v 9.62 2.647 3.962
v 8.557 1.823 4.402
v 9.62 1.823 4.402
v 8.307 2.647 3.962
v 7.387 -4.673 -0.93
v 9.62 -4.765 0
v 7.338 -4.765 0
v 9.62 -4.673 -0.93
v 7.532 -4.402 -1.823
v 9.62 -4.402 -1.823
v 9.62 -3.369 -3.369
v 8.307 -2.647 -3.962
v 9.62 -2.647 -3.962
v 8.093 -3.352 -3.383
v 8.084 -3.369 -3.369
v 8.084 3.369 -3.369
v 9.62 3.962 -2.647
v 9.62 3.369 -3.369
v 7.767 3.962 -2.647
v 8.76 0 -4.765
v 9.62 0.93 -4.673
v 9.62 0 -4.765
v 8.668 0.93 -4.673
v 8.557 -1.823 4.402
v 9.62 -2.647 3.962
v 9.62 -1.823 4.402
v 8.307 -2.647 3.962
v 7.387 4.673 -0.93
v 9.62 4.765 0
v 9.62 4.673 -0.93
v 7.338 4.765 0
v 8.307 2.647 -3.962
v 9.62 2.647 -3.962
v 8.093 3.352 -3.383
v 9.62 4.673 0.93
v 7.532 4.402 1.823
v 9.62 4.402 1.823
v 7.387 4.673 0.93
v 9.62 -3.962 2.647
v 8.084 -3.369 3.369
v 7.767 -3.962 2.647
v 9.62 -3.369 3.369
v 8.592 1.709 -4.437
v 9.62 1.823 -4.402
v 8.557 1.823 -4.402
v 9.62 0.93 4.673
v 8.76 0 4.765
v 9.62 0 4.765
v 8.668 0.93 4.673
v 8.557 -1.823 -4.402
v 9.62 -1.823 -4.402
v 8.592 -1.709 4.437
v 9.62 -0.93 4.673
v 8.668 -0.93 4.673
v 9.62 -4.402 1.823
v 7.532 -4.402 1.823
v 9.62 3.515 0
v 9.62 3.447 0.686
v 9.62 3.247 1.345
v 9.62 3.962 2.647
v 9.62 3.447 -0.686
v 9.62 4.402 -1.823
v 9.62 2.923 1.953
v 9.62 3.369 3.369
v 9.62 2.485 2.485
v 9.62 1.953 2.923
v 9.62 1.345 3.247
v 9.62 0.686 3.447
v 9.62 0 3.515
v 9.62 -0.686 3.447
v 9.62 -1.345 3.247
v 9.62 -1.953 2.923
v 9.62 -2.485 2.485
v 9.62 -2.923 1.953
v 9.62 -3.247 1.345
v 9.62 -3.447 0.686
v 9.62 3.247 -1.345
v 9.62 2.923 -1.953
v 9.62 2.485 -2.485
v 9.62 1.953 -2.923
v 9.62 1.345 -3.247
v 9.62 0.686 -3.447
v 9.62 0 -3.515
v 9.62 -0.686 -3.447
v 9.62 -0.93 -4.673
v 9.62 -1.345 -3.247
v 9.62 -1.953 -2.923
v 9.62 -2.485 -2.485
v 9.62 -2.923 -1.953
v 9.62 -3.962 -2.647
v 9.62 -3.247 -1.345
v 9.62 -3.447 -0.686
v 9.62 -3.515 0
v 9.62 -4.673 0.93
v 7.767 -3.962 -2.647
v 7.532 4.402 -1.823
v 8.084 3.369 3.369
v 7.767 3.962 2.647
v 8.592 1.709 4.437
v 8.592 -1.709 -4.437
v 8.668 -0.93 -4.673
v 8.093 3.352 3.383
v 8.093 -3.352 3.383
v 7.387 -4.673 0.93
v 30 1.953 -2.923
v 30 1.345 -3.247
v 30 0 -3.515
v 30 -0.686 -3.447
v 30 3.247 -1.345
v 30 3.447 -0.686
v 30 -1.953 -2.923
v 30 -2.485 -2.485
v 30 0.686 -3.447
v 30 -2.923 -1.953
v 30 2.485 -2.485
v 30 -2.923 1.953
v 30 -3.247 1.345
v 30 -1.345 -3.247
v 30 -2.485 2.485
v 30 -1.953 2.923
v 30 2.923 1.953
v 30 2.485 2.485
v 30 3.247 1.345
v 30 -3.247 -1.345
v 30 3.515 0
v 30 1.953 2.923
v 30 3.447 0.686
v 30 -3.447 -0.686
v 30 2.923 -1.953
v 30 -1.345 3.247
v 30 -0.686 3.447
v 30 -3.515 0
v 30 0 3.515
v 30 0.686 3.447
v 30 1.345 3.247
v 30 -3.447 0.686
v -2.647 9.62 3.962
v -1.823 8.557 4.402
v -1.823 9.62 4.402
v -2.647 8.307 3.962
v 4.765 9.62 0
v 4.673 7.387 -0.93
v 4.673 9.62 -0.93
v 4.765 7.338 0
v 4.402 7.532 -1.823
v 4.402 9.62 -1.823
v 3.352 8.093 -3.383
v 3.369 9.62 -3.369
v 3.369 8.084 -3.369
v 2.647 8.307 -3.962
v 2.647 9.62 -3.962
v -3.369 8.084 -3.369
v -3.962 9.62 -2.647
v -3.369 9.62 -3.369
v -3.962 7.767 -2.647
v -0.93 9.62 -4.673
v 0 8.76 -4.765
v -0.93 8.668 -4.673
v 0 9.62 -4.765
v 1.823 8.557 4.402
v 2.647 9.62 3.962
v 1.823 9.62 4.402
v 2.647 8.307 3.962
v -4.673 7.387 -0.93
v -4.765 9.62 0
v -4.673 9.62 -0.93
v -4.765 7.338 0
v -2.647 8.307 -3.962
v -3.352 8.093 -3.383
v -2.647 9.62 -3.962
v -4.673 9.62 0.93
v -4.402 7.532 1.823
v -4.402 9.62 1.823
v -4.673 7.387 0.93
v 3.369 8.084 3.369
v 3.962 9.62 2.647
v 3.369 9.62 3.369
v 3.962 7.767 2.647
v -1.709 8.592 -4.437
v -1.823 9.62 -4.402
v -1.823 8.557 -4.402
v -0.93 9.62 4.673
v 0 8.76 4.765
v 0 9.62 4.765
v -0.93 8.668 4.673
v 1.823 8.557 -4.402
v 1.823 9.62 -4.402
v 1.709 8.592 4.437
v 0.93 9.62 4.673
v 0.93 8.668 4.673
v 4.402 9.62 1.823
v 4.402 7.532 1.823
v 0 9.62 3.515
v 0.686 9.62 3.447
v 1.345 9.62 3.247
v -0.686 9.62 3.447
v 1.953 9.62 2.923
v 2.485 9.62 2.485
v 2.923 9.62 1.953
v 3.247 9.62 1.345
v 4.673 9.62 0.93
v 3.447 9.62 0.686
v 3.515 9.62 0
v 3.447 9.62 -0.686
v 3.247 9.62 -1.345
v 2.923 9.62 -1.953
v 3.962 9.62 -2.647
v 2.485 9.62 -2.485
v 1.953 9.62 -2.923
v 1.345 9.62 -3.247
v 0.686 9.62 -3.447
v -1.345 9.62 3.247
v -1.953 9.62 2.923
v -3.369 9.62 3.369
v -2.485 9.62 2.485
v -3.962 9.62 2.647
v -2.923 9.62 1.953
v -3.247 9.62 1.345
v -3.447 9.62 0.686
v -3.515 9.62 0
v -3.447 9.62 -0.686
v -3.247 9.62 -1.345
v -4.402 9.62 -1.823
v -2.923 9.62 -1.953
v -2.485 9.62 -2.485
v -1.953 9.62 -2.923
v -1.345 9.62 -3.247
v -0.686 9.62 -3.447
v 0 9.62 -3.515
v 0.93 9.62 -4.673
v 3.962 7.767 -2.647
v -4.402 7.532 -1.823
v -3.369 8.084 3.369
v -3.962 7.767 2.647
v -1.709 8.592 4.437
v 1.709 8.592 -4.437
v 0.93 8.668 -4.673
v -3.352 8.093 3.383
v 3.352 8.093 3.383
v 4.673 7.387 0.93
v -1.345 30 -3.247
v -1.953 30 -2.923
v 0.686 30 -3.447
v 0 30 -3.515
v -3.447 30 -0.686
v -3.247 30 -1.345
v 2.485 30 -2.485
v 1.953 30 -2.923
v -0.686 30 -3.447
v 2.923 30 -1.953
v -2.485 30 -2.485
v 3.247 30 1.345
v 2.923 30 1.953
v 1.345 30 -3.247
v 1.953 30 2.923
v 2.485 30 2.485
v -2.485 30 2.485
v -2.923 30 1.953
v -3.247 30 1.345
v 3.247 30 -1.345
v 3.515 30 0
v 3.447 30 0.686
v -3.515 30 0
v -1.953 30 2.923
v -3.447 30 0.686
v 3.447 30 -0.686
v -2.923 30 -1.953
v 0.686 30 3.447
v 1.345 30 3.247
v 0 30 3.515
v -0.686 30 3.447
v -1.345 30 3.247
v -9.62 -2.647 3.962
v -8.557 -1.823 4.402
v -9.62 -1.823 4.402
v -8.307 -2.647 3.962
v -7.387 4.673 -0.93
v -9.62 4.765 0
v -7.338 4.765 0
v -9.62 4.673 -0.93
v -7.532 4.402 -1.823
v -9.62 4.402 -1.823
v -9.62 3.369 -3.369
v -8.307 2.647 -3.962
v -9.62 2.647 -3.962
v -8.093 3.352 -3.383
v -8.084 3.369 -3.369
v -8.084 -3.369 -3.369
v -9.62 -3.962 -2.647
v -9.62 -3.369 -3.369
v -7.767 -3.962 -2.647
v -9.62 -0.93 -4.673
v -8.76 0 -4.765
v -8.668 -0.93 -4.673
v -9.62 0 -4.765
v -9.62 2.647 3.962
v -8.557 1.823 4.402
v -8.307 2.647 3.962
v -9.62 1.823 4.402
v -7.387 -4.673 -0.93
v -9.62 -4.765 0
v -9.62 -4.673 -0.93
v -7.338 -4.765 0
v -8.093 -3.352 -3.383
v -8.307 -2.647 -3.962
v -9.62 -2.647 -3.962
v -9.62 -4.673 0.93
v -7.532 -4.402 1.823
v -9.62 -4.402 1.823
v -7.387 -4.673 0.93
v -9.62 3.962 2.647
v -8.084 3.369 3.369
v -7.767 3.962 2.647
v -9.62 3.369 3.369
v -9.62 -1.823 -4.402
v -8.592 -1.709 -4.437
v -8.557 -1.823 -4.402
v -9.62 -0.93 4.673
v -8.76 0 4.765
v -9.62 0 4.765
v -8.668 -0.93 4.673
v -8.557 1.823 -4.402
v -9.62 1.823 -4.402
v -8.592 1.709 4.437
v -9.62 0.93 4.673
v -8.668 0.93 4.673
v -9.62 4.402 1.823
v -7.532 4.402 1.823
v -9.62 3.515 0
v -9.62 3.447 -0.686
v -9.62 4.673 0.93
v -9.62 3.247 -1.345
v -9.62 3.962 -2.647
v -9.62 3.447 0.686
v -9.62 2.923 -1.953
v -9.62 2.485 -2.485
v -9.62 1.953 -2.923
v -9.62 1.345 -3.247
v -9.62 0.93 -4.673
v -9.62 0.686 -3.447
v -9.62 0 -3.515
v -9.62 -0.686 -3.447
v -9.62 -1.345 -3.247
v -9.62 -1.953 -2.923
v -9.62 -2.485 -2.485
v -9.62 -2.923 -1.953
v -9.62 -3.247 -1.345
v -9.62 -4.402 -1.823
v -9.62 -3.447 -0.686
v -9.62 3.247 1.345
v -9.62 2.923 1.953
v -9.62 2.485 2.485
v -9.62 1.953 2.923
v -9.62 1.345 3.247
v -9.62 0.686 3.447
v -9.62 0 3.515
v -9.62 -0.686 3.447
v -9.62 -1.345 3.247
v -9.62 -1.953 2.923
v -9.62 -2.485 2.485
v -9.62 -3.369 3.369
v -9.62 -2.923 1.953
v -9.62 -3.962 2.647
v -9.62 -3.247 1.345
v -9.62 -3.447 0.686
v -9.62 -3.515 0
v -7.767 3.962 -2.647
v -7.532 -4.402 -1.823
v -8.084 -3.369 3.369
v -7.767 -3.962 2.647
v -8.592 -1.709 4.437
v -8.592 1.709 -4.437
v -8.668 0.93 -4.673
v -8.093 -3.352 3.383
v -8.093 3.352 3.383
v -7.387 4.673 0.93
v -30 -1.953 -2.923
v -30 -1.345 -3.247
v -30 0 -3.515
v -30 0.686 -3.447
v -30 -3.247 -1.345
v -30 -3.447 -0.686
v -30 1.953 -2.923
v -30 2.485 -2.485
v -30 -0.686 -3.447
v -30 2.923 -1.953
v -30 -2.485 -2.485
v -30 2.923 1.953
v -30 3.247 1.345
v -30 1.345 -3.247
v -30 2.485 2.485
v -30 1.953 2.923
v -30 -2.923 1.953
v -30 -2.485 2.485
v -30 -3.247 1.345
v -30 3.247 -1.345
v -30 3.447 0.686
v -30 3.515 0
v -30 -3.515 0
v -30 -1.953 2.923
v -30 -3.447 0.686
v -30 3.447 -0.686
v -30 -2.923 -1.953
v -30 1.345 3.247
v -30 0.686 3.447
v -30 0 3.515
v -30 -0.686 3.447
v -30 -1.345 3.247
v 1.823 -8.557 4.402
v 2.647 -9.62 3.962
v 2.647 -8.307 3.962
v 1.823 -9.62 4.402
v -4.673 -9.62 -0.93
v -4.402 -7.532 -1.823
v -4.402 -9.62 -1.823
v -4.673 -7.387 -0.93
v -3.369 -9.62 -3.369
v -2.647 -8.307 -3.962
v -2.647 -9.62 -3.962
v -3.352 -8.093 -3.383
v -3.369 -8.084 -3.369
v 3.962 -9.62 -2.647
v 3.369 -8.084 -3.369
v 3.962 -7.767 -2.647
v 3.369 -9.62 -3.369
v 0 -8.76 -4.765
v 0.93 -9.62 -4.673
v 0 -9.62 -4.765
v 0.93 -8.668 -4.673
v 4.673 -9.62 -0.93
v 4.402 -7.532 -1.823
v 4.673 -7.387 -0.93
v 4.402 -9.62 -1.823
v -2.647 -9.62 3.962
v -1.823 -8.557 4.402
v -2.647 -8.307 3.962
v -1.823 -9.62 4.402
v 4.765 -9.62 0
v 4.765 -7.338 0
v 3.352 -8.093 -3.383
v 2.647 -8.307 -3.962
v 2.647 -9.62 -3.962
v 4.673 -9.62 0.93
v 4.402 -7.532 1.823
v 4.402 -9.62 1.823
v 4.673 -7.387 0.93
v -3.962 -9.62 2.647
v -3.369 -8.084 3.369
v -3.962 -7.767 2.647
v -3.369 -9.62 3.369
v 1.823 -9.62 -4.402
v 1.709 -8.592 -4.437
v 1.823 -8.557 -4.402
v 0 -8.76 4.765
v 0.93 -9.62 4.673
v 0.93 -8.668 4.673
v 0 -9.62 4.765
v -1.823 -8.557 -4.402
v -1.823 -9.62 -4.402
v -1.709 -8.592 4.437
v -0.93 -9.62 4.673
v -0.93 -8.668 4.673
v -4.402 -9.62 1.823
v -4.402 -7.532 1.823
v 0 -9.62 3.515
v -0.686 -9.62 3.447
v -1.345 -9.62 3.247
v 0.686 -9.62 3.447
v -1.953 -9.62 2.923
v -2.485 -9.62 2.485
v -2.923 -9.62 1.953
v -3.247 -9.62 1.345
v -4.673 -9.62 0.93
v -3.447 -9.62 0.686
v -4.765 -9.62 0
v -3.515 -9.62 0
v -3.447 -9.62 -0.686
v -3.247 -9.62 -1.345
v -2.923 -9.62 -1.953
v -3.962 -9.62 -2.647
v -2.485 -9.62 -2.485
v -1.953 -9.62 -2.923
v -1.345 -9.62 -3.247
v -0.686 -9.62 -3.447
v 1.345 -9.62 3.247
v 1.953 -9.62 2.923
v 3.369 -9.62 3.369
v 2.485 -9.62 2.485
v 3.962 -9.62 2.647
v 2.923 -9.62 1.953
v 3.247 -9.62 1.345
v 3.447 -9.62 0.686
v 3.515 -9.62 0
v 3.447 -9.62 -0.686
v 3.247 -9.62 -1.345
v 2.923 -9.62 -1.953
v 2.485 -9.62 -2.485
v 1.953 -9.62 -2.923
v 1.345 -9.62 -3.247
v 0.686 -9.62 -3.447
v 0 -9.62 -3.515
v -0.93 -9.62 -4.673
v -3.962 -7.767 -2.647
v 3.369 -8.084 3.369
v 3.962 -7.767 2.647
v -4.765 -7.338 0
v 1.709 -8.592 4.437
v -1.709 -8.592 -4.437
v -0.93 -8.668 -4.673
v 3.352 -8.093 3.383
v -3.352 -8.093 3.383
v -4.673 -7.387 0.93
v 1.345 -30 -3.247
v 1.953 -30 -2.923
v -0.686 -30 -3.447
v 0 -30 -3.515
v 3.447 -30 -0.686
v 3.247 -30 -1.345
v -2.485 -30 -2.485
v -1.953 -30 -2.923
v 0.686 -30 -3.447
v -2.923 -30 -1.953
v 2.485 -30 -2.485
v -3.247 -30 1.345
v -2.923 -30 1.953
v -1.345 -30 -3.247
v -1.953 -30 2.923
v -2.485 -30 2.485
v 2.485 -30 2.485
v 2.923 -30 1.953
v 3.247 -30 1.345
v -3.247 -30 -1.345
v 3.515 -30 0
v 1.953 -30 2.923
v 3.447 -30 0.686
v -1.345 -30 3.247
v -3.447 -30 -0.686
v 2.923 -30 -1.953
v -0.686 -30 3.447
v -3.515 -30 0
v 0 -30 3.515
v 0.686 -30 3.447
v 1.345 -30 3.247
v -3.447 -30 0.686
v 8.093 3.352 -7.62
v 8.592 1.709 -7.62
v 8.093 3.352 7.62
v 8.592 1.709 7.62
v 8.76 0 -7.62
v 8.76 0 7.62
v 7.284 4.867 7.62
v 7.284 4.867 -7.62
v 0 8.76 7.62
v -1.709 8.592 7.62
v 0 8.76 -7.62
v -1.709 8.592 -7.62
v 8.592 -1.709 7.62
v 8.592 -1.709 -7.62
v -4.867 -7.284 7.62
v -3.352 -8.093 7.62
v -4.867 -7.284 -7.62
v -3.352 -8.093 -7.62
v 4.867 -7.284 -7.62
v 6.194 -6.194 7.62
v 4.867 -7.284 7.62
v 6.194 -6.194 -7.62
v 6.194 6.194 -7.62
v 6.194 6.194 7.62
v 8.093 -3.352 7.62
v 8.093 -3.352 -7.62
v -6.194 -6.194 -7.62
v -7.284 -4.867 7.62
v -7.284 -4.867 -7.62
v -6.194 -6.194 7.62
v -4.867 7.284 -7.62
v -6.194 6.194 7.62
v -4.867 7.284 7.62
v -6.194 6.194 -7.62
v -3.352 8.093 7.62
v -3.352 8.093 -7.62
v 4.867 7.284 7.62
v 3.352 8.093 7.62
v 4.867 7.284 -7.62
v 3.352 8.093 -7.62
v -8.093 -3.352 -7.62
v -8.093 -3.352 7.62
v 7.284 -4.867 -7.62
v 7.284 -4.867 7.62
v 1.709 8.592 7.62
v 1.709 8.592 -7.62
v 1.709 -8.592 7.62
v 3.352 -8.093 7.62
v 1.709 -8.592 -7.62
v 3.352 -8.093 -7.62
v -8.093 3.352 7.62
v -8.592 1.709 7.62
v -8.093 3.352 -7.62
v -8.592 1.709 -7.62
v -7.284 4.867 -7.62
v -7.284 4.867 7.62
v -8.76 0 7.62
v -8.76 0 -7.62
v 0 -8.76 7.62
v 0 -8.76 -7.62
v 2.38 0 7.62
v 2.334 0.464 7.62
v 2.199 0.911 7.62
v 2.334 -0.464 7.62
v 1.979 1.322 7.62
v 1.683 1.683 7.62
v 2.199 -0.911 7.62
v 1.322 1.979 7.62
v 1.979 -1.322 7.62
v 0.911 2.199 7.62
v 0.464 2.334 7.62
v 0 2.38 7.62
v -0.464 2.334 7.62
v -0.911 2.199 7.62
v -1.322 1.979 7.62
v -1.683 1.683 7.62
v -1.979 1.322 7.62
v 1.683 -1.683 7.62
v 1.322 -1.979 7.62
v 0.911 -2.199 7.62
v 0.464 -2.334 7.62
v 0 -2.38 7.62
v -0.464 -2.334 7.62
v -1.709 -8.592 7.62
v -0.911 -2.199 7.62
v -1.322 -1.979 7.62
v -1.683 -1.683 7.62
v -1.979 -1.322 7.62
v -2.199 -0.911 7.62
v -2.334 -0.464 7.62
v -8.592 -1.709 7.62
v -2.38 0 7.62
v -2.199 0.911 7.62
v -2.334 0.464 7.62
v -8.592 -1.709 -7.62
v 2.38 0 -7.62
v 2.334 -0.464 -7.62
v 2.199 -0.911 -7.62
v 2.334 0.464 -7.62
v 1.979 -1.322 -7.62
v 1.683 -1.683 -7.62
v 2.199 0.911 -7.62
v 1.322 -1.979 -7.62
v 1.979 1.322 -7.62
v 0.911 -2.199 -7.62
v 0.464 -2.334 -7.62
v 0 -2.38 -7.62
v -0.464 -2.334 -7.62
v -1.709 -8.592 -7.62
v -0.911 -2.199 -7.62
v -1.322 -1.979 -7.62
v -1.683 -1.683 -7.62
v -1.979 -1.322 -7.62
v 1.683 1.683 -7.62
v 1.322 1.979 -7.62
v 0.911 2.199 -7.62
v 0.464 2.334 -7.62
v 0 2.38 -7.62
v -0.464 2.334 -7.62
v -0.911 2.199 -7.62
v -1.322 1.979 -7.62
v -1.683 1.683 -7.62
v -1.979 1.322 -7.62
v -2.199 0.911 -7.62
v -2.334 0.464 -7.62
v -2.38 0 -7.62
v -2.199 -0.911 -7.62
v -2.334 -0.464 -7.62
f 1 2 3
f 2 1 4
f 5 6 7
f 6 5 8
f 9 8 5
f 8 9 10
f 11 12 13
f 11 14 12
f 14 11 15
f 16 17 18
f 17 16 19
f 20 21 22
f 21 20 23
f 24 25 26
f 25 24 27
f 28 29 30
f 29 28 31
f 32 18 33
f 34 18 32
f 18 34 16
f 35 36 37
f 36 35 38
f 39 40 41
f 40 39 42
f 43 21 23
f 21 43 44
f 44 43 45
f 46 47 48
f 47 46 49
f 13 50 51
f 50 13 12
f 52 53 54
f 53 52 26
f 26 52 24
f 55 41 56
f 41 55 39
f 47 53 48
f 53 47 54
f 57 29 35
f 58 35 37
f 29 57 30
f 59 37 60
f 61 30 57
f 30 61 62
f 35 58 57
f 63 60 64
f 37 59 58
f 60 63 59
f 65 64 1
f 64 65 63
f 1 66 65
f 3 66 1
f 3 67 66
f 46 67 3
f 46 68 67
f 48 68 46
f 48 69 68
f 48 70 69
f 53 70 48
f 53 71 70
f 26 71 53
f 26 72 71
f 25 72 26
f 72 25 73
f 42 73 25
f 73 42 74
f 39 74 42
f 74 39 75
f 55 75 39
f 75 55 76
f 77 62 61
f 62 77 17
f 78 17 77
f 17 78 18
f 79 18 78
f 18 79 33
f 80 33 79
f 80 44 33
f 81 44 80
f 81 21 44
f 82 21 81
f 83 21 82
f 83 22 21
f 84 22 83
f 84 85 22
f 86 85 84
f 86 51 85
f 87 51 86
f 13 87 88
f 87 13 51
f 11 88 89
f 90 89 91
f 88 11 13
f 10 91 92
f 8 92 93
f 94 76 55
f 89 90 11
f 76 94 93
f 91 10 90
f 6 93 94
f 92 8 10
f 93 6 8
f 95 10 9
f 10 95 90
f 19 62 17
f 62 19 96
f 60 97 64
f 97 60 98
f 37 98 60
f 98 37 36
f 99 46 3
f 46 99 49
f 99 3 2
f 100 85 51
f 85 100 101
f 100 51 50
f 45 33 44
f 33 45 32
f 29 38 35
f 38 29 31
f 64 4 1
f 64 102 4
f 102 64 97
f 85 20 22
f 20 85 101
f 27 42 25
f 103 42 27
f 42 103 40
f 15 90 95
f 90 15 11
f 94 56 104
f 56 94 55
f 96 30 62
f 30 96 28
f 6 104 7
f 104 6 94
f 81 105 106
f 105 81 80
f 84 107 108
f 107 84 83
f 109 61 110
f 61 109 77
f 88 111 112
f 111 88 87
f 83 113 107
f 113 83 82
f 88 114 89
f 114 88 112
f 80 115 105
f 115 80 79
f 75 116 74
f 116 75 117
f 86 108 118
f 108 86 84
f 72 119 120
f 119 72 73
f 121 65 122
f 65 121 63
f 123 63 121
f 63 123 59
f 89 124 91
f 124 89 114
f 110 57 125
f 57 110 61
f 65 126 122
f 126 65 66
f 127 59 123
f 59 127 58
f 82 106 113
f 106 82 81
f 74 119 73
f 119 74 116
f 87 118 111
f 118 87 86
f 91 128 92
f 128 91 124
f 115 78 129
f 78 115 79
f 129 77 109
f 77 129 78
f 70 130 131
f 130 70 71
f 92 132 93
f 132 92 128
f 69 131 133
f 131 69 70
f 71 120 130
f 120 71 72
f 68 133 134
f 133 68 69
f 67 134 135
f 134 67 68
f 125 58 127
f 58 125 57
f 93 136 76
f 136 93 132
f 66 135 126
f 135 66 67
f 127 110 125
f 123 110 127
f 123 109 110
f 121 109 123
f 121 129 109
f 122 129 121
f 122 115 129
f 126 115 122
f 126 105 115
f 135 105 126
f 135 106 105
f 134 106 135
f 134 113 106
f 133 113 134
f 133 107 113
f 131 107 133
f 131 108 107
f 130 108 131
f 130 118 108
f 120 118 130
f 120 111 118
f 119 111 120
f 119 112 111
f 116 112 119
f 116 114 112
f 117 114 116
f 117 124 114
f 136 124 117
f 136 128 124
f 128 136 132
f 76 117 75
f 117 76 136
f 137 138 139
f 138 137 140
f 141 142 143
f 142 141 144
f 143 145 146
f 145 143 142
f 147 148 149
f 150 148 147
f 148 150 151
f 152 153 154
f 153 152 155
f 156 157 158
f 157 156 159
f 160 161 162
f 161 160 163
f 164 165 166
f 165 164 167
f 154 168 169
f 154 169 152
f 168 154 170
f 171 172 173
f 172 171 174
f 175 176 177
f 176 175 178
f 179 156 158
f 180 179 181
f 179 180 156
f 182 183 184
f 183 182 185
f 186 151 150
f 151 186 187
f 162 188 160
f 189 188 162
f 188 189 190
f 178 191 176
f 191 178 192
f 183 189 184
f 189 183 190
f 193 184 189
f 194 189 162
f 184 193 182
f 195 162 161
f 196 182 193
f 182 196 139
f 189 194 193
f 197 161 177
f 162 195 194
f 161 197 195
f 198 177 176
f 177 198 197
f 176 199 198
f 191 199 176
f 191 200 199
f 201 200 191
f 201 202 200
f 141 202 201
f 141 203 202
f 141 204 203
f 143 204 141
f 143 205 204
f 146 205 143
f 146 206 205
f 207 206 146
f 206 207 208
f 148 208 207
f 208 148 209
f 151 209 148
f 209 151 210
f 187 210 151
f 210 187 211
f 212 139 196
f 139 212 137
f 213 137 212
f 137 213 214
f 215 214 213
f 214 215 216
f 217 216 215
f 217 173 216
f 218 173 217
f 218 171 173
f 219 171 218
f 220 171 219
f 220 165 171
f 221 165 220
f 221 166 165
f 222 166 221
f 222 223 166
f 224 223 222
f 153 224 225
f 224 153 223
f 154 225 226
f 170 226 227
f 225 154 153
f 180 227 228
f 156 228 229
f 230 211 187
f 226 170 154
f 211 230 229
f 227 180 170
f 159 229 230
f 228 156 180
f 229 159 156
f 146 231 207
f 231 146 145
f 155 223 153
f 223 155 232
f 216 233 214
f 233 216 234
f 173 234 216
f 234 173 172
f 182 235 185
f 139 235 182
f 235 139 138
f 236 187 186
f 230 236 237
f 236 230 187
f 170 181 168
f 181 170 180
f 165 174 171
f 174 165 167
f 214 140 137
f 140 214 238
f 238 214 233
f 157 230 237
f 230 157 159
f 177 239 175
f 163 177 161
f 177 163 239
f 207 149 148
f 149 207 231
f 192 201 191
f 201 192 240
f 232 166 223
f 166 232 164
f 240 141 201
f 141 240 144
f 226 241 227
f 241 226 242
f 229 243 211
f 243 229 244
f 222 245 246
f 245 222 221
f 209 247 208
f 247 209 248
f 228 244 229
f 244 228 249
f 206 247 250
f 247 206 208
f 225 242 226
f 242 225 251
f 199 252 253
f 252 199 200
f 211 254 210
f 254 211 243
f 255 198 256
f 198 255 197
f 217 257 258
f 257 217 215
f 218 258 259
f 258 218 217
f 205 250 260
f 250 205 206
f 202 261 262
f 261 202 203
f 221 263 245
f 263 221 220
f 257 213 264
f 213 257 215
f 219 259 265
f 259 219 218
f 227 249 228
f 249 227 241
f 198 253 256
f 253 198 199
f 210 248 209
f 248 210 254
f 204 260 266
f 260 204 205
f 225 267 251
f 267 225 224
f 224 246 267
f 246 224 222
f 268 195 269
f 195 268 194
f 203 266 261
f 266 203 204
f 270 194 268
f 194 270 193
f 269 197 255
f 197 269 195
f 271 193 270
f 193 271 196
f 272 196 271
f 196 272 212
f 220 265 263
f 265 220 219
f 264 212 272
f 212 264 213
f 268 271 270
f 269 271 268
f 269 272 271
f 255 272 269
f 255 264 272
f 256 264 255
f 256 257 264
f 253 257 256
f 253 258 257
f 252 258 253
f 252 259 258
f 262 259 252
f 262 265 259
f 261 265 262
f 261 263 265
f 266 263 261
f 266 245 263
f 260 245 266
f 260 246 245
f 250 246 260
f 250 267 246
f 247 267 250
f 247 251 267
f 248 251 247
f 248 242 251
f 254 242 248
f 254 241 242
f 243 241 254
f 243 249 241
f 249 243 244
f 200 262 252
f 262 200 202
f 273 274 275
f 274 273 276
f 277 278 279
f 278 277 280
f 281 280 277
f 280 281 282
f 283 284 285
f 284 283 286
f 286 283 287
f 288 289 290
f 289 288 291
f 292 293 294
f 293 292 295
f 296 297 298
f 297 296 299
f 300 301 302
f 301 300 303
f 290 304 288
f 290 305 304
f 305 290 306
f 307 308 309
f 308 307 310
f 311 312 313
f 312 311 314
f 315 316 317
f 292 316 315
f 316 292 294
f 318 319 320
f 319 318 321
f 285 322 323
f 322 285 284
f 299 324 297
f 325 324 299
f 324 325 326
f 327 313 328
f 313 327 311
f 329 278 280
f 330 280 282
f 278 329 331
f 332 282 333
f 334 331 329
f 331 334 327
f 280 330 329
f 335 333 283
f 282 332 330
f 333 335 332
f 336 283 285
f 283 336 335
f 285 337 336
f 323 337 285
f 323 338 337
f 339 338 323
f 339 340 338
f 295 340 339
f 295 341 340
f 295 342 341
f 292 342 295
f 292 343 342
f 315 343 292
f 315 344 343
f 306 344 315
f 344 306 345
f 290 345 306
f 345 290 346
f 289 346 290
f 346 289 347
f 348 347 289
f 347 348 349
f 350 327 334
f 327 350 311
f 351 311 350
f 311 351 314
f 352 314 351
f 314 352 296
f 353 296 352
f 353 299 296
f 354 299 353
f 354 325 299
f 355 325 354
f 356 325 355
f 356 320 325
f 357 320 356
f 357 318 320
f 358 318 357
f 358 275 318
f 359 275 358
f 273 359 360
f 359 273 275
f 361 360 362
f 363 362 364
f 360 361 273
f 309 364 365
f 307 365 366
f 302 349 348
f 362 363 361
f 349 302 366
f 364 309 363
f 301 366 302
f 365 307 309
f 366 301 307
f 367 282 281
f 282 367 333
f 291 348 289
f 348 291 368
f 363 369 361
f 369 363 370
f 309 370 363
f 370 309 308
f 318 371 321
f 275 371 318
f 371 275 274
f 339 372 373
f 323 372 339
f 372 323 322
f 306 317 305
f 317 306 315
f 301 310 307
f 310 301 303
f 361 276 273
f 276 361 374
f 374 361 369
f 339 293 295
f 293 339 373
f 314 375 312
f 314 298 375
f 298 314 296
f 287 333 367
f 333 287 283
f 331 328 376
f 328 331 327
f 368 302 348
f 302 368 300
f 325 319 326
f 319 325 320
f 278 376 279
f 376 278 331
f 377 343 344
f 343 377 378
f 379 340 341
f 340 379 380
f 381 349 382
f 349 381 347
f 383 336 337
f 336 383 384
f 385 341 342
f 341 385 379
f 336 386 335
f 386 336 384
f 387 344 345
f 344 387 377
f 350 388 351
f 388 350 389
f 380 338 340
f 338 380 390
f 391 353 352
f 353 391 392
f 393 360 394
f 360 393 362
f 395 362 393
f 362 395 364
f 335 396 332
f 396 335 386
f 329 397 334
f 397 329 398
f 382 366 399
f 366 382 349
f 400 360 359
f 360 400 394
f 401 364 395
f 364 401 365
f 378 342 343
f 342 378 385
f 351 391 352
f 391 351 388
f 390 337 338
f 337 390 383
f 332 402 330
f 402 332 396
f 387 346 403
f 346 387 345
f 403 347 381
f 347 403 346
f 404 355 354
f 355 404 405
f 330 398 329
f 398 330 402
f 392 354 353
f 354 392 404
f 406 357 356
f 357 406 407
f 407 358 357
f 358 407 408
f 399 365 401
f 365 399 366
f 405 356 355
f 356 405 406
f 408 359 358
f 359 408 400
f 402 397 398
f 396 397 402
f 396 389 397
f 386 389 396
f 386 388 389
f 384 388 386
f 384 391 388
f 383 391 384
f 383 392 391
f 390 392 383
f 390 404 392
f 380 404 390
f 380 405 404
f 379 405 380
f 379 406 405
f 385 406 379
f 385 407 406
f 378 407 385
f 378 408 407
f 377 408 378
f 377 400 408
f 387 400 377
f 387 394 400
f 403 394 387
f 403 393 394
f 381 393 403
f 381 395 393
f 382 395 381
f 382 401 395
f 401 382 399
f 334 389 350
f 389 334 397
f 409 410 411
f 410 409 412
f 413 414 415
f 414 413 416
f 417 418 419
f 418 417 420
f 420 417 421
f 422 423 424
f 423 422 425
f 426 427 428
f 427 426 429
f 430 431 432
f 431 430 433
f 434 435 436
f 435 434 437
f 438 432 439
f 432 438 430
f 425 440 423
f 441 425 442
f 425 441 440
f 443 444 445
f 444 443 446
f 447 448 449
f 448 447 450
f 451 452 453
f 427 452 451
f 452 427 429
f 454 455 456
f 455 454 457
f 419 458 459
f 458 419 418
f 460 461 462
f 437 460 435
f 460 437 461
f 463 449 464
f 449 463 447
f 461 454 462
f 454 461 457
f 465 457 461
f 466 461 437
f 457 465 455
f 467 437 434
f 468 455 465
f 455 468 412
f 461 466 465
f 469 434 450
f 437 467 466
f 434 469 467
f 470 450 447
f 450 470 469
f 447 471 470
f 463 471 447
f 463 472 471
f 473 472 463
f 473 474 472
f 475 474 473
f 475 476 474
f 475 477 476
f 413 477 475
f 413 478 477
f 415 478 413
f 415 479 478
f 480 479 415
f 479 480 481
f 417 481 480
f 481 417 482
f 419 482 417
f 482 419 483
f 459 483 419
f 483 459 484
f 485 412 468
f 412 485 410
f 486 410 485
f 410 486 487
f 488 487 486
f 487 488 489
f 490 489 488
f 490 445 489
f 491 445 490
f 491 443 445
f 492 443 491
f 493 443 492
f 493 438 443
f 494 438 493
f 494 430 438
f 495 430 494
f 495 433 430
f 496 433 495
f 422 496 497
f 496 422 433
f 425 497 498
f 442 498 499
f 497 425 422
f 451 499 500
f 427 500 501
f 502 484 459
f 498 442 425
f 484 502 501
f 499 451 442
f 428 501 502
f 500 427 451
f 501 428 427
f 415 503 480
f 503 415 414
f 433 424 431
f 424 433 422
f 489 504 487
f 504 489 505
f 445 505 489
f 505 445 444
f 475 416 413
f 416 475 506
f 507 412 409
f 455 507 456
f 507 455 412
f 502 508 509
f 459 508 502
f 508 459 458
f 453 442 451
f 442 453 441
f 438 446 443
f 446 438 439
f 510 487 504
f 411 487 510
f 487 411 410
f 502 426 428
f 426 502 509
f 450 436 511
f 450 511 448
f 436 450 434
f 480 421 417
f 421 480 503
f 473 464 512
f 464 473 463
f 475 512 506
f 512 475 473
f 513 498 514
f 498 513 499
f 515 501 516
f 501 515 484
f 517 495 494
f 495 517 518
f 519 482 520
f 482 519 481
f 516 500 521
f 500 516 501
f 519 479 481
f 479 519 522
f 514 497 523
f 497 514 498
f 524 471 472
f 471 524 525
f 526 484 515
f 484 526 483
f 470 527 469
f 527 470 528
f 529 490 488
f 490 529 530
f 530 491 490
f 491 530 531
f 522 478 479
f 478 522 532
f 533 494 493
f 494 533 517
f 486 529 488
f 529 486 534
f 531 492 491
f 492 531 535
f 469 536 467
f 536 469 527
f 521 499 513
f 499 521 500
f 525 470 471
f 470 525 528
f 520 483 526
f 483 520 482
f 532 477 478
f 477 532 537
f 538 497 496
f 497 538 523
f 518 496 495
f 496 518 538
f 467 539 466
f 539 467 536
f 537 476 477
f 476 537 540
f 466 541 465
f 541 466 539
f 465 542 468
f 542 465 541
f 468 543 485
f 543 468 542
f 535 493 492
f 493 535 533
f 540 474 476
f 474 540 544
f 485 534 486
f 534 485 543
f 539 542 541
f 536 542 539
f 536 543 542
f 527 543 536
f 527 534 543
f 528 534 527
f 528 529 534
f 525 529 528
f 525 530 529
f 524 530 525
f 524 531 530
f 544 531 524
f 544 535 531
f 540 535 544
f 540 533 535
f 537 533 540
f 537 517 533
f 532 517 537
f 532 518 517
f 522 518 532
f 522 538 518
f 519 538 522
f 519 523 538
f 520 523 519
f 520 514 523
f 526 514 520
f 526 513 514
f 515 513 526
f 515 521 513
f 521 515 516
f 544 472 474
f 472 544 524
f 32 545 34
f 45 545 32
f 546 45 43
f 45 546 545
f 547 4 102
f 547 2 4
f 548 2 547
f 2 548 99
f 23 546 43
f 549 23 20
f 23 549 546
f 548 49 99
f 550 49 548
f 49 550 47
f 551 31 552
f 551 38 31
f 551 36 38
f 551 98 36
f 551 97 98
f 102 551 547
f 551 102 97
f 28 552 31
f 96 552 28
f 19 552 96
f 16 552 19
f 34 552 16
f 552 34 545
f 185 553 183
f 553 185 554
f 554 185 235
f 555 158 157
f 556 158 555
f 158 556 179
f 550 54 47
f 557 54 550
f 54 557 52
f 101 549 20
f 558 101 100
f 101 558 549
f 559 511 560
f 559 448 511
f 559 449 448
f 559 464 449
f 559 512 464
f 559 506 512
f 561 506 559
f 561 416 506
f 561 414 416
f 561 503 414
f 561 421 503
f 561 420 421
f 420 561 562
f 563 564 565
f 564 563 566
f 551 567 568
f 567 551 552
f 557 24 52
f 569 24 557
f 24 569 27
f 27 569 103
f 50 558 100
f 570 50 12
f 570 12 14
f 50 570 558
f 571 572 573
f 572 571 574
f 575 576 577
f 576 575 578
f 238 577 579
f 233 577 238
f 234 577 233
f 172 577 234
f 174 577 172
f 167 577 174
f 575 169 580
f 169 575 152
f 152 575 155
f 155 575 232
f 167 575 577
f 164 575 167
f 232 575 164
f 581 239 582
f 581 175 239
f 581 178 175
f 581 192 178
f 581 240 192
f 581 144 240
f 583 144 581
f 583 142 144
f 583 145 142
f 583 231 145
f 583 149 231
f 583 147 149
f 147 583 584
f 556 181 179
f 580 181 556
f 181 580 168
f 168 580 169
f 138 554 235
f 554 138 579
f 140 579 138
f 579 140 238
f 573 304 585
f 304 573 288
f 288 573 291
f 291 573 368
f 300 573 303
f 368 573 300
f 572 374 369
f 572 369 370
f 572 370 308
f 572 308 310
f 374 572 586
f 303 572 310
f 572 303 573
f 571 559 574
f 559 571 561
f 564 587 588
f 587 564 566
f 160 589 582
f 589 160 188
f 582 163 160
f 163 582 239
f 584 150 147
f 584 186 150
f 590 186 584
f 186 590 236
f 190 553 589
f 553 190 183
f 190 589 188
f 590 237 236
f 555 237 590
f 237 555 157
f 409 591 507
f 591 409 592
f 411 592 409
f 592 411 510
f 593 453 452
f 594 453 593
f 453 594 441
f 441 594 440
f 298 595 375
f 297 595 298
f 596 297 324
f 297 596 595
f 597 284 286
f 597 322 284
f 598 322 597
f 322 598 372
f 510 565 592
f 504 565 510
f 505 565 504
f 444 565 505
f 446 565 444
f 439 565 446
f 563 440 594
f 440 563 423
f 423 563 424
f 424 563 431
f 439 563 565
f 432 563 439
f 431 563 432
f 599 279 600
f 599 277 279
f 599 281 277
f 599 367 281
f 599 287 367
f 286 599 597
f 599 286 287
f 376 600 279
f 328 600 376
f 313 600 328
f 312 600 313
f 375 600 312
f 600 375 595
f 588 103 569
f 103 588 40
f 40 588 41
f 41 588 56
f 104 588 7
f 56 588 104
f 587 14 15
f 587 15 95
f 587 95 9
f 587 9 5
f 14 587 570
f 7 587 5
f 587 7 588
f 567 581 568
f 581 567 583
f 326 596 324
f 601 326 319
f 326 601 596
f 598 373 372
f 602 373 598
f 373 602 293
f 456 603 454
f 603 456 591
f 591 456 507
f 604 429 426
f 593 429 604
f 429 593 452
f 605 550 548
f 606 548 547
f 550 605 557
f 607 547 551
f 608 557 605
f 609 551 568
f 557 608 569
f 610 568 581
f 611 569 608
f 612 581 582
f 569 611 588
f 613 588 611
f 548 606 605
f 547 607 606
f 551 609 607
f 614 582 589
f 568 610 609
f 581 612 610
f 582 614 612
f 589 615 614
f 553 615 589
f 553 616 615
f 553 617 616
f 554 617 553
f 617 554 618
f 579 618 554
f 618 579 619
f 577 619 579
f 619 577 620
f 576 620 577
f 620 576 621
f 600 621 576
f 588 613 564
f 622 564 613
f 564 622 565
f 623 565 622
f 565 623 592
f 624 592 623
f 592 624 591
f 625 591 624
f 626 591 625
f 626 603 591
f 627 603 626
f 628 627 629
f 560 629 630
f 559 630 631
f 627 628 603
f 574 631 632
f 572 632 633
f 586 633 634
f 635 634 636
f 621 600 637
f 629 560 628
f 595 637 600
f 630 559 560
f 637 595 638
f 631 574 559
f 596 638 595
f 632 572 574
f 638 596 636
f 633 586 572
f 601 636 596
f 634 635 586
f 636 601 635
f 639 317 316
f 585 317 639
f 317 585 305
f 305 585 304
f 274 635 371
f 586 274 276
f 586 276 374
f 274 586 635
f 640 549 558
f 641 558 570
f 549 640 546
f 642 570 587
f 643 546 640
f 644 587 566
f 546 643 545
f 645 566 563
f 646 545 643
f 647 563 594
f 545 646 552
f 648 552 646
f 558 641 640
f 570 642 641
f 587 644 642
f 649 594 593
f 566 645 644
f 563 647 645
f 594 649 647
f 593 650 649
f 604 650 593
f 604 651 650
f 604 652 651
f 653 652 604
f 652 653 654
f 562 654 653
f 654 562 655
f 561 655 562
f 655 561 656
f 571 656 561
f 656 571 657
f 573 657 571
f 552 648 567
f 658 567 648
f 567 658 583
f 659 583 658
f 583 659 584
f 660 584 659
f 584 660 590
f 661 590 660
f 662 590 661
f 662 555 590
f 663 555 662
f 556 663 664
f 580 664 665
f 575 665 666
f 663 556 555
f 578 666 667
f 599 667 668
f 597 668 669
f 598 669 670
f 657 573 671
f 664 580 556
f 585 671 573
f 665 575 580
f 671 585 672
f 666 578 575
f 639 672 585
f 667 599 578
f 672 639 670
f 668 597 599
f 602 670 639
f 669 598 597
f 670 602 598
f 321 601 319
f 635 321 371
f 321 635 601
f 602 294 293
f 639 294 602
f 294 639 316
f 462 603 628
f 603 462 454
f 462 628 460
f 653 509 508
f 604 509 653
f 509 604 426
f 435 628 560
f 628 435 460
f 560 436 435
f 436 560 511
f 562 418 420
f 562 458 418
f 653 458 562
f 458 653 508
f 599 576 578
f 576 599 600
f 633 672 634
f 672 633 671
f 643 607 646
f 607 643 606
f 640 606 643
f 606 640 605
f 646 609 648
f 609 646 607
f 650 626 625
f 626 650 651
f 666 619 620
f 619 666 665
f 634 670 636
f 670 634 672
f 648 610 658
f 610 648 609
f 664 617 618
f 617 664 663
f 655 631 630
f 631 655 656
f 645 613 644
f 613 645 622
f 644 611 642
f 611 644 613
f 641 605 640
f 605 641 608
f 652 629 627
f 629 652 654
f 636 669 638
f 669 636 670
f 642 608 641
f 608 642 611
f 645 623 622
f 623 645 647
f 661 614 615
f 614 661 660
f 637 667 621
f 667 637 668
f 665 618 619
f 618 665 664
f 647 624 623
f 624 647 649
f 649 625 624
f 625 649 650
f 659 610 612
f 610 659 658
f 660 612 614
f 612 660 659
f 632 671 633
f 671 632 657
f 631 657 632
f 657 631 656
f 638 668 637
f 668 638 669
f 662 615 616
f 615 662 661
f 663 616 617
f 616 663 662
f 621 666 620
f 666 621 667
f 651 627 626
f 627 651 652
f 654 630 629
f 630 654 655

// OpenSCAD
$fn = 32;

// ----------------------------------------------------------------------
// Cardan cross: 60 mm span, 9.53 mm trunnions
// ----------------------------------------------------------------------

// --- parameters (mm) ---
journal_d = 9.53;         // trunnion diameter
arm_len = 30;             // trunnion length from the centre
step_r = 3.24;            // step position from the centre
step_d = 7.03;            // journal diameter after the step
hub_d = 17.52;            // hub diameter
hub_h = 15.24;            // hub height
bore_d = 4.76;            // hub bore

difference() {
  union() {
    /* hub along the joint axis */
    cylinder(h = hub_h, d = hub_d, center = true);
    for (a = [0 : 90 : 270]) rotate([0, 0, a]) {
      /* trunnion, sunk into the hub */
      translate([hub_d / 4, 0, 0]) rotate([0, 90, 0]) cylinder(h = step_r + 2, d = journal_d);
      /* stepped journal out to the tip */
      translate([step_r - 0.5, 0, 0]) rotate([0, 90, 0]) cylinder(h = arm_len + 0.5 - step_r, d = step_d);
    }
  }
  /* lubrication bore through the hub, 2.5 mm clear on both sides */
  translate([0, 0, -hub_h / 2 - 2.5]) cylinder(h = hub_h + 5, d = bore_d);
}
